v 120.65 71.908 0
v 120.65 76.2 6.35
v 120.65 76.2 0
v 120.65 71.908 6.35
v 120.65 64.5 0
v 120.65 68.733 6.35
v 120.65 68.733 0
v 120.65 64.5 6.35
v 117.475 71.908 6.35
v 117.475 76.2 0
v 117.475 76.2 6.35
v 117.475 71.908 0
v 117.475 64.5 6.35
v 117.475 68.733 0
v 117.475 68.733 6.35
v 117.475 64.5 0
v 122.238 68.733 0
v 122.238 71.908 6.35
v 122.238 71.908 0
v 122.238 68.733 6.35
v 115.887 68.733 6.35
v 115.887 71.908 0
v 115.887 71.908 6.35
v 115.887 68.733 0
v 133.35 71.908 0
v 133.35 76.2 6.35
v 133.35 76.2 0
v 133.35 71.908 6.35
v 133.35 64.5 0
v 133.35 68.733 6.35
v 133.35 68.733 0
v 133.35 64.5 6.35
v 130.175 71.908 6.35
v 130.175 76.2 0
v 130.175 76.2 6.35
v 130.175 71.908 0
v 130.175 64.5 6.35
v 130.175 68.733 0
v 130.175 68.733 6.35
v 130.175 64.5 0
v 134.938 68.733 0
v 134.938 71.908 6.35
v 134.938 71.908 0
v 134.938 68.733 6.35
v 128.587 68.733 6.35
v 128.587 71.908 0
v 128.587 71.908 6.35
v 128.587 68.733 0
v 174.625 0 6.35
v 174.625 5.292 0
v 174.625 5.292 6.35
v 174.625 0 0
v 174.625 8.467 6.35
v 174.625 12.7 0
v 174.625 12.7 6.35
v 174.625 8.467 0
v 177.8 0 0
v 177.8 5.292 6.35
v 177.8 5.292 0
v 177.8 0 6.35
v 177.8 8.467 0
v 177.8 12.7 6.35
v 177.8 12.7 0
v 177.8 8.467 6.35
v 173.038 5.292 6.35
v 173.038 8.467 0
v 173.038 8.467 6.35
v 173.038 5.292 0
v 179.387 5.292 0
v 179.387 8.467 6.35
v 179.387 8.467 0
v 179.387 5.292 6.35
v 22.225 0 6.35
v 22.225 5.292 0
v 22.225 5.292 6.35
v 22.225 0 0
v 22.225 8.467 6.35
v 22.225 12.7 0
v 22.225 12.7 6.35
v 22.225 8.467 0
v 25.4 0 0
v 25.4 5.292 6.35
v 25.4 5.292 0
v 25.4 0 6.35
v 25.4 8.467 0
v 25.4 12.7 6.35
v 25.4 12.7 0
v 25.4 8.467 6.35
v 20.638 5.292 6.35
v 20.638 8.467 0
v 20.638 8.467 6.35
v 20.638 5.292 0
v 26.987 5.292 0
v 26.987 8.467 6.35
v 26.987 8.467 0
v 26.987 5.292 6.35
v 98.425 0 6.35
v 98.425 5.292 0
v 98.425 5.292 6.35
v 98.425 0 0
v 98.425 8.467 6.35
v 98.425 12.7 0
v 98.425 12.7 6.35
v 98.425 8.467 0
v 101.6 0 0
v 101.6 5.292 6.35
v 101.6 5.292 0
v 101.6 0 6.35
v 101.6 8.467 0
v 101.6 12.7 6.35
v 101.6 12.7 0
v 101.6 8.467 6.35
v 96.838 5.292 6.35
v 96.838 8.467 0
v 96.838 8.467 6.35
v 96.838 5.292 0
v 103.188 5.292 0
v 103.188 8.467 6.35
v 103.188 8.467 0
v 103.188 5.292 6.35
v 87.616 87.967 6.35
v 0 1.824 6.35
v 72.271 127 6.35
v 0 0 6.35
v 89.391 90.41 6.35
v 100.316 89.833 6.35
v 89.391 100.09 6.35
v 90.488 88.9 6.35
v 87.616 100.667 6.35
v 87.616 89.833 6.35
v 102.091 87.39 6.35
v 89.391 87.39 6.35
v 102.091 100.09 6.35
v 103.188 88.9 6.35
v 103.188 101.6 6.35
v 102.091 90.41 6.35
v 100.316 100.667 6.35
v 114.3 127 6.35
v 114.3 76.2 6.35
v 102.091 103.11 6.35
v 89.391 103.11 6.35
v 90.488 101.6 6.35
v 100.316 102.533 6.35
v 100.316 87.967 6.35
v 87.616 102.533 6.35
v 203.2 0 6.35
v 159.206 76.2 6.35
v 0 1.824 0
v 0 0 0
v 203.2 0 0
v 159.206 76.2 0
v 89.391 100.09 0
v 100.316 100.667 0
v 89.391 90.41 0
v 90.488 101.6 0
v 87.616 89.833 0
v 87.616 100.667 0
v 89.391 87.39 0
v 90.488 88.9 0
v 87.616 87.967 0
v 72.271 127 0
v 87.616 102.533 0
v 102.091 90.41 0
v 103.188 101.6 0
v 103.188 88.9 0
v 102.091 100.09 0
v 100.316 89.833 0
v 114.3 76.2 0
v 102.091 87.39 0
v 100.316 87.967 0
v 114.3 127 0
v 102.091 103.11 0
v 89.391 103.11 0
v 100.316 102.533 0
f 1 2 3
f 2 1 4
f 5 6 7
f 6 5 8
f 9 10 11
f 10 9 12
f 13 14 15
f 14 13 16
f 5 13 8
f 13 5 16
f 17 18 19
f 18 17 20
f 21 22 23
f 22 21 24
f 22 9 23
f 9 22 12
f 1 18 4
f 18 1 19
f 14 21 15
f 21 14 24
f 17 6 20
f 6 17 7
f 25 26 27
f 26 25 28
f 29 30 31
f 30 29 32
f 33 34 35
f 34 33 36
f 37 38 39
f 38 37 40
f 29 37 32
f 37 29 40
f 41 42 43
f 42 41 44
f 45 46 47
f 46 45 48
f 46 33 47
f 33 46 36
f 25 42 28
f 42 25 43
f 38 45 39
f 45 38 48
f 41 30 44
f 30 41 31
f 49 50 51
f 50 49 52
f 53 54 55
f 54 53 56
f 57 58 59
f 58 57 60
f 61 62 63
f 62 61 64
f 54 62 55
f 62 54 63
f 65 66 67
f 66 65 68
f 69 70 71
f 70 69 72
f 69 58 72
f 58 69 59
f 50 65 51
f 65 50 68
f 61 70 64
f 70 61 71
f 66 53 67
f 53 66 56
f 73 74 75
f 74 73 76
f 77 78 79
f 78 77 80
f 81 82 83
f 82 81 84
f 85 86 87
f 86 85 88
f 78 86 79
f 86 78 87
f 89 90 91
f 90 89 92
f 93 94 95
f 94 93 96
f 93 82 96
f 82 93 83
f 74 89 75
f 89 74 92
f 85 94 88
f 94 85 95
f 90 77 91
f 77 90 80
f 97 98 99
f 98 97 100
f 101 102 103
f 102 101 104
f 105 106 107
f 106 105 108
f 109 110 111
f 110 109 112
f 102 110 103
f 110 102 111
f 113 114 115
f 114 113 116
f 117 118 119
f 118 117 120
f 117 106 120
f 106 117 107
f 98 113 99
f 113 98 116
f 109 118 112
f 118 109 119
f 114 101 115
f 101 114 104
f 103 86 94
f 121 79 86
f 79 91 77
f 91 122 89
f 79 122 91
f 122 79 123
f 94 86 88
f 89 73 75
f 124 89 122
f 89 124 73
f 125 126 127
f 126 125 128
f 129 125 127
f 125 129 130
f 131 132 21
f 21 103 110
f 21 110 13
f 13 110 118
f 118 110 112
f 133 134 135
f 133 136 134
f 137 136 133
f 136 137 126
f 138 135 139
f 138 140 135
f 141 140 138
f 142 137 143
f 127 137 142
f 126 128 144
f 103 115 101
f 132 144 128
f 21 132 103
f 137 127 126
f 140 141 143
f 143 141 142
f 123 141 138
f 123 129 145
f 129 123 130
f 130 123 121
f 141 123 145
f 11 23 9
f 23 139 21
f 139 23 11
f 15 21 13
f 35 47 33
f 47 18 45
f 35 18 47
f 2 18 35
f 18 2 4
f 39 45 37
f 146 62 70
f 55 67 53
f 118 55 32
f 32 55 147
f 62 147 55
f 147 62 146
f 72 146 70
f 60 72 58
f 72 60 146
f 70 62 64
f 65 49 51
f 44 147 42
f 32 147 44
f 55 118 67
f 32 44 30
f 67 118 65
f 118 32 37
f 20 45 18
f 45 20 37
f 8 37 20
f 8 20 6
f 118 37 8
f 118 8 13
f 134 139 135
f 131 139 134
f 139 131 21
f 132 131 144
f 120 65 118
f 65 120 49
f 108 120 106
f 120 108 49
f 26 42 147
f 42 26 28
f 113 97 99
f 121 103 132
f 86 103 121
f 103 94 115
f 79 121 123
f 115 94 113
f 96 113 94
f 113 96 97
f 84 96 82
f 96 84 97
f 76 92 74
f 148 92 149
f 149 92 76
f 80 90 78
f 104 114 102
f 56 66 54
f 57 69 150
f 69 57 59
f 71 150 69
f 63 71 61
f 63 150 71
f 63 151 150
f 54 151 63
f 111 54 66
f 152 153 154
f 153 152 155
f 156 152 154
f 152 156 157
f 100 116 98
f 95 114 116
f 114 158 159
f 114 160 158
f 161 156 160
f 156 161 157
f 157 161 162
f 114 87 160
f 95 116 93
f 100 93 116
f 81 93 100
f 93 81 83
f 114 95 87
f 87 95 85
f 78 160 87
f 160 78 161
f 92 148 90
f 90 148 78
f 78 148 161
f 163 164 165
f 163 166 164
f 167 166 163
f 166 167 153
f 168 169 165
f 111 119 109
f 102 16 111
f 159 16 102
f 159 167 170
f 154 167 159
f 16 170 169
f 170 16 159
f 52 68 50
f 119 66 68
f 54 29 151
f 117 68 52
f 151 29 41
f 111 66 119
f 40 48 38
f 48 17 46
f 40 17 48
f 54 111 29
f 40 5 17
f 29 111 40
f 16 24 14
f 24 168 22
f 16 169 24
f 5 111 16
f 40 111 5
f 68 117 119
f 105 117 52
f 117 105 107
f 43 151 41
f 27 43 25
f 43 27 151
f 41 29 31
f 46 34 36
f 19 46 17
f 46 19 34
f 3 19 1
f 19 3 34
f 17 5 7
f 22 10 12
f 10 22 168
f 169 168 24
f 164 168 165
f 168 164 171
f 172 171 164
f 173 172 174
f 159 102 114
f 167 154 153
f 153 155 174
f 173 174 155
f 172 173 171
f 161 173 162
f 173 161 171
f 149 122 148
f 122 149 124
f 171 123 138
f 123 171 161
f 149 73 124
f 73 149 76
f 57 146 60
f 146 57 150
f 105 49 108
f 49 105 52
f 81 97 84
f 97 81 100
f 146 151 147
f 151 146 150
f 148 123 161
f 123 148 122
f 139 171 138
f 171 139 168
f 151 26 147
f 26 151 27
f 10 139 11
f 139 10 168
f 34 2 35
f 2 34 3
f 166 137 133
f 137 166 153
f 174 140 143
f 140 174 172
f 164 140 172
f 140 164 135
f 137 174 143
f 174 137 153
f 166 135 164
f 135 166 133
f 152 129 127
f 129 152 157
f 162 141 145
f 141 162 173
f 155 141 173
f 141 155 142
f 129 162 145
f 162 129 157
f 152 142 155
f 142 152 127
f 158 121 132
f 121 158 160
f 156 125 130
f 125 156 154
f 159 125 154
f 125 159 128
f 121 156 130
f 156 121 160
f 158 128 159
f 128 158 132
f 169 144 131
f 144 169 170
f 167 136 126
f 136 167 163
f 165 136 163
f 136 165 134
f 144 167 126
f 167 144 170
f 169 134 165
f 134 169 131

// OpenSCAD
function mm(i) = i*25.4; 
    rolldiam = mm(8); //diameter of the roll of paper
    tubediam = mm(2); //diameter of the cardboard tube at the center
	 thickness= mm(.25); // thickness of material
	 boltwidth = mm(1/8); // desired diameter of bolt holes
	 boltdepth = mm(.5); // desired depth of bolts
	 nutwidth = mm(1/4); //desired width of nuts
	 nutheight = mm(1/8); //desired height of nuts

module bolthole(thickness=mm(.25), rolldiam=mm(8), tubediam=mm(2))
	{
	union()
		{
			cube ([boltwidth, boltdepth+1, thickness+2]);
			translate([-(nutwidth/2-boltwidth/2), boltdepth/3, 0])
				{
					cube([nutwidth, nutheight, thickness+2]);
				}
		}
	}

	 

module side(thickness=mm(.25), rolldiam=mm(8), tubediam=mm(2)) 
    { 
			 difference() 
         { 
         	cube([rolldiam, rolldiam/2-tubediam/2+mm(2), thickness]);
				translate([rolldiam, 0, -1])
					{
					rotate([0, 0, 30])
						{
						cube([rolldiam, rolldiam, thickness+2]);
						}
					}
				rotate([0,0,180])
					{
					translate([-rolldiam/2, -rolldiam+mm(1), -1])
						{
						rotate([0, 0, -30])
							{
							cube([rolldiam, rolldiam, thickness+2]);
							}
						}
					}
				translate([3*(rolldiam/2-tubediam/2)/2, (rolldiam/2-tubediam/2), -1])
				{
					cube ([rolldiam/2-tubediam/2, rolldiam/2-tubediam/2, thickness+2]);
				}
				translate([3*(rolldiam/2-tubediam/2)/2+mm(.25/2), (rolldiam/2-tubediam/2)-boltdepth+1, -1])
				{
					bolthole();
				}
				translate([3*(rolldiam/2-tubediam/2)/2+mm(.25/2+.5), (rolldiam/2-tubediam/2)-boltdepth+1, -1])
				bolthole();

				translate([rolldiam -mm(1), boltdepth, -1])
					rotate([0,0,180])
						{
							bolthole();
						}
				translate([mm(1), boltdepth, -1])
					rotate([0,0,180])
						{
							bolthole();
						}
				translate([rolldiam/2, boltdepth, -1])
					rotate([0,0,180])
						{
							bolthole();
						}
				translate([rolldiam/2-tubediam/2+mm(1), rolldiam/2, -1])
					{
						cylinder(thickness+2, boltwidth/2, boltwidth/2, 0);
					}
				translate([rolldiam/2-tubediam/2+mm(.5), rolldiam/2, -1])
					{
						cylinder(thickness+2, boltwidth/2, boltwidth/2, 0);
					}
				translate([rolldiam/2-tubediam/2+mm(.5), rolldiam/2-mm(.5), -1])
					{
						cylinder(thickness+2, boltwidth/2, boltwidth/2, 0);
					}
translate([rolldiam/2-tubediam/2+mm(1), rolldiam/2-mm(.5), -1])
					{
						cylinder(thickness+2, boltwidth/2, boltwidth/2, 0);
					}

	 }
}



side();

module tubehold(tubediam=mm(2),thickness=mm(.25), rolldiam=mm(8),) 
    {
		translate([rolldiam/2-mm(.25), rolldiam/2-tubediam/2+mm(1)-mm(.25), 0])
			{
			cylinder(thickness+2, tubediam/2, tubediam/2, 0);
			}
	 }

//#tubehold();



//	cube([rollheight+mm(2), (rolldiam/2-tubediam/2)+mm(.5), thickness])//;
    
//              translate([mm(.75), -1, -1]) 
//              { 
  //               cube([rollheight+mm(.5), (rolldiam/2-tubediam/2)+1,thickness+2]);
 //   			  }
//		 translate([mm(.375)-mm(.375/2), mm(.25/2), -1]) 
//             { 
 //                cylinder(thickness+2, boltwidth/2, boltwidth/2, 0);
 //            } 
//		 translate([mm(.375)+mm(.375/2), mm(.25/2), -1]) 
 //            { 
 //                cylinder(thickness+2, boltwidth/2, boltwidth/2, 0);
  //           } 
	//	 translate([mm(.375)+mm(.375/2), mm(.25+.25/2), -1]) 
   //          { 
    //             cylinder(thickness+2, boltwidth/2, boltwidth/2, 0);
  //           } 
	//	 translate([mm(.375)-mm(.375/2), mm(.25+.25/2), -1]) 
  //           { 
  //               cylinder(thickness+2, boltwidth/2, boltwidth/2, 0);
  //           } 
//			translate([rollheight+mm(1.25), 0, -1])
//			{
//				 translate([mm(.375)-mm(.375/2), mm(.25/2), -1]) 
 //            	{ 
 //                cylinder(thickness+2, boltwidth/2, boltwidth/2, 0);
 //           	} 
//				 translate([mm(.375)+mm(.375/2), mm(.25/2), -1]) 
 //            	{ 
  //               cylinder(thickness+2, boltwidth/2, boltwidth/2, 0);
//             	} 
//		 		translate([mm(.375)+mm(.375/2), mm(.25+.25/2), -1]) 
//             	{ 
//                 cylinder(thickness+2, boltwidth/2, boltwidth/2, 0);
//             	} 
//
  //
    //             cylinder(thickness+2, boltwidth/2, boltwidth/2, 0);
    //         	} 
		//}		
	//}
// }   
    


   
